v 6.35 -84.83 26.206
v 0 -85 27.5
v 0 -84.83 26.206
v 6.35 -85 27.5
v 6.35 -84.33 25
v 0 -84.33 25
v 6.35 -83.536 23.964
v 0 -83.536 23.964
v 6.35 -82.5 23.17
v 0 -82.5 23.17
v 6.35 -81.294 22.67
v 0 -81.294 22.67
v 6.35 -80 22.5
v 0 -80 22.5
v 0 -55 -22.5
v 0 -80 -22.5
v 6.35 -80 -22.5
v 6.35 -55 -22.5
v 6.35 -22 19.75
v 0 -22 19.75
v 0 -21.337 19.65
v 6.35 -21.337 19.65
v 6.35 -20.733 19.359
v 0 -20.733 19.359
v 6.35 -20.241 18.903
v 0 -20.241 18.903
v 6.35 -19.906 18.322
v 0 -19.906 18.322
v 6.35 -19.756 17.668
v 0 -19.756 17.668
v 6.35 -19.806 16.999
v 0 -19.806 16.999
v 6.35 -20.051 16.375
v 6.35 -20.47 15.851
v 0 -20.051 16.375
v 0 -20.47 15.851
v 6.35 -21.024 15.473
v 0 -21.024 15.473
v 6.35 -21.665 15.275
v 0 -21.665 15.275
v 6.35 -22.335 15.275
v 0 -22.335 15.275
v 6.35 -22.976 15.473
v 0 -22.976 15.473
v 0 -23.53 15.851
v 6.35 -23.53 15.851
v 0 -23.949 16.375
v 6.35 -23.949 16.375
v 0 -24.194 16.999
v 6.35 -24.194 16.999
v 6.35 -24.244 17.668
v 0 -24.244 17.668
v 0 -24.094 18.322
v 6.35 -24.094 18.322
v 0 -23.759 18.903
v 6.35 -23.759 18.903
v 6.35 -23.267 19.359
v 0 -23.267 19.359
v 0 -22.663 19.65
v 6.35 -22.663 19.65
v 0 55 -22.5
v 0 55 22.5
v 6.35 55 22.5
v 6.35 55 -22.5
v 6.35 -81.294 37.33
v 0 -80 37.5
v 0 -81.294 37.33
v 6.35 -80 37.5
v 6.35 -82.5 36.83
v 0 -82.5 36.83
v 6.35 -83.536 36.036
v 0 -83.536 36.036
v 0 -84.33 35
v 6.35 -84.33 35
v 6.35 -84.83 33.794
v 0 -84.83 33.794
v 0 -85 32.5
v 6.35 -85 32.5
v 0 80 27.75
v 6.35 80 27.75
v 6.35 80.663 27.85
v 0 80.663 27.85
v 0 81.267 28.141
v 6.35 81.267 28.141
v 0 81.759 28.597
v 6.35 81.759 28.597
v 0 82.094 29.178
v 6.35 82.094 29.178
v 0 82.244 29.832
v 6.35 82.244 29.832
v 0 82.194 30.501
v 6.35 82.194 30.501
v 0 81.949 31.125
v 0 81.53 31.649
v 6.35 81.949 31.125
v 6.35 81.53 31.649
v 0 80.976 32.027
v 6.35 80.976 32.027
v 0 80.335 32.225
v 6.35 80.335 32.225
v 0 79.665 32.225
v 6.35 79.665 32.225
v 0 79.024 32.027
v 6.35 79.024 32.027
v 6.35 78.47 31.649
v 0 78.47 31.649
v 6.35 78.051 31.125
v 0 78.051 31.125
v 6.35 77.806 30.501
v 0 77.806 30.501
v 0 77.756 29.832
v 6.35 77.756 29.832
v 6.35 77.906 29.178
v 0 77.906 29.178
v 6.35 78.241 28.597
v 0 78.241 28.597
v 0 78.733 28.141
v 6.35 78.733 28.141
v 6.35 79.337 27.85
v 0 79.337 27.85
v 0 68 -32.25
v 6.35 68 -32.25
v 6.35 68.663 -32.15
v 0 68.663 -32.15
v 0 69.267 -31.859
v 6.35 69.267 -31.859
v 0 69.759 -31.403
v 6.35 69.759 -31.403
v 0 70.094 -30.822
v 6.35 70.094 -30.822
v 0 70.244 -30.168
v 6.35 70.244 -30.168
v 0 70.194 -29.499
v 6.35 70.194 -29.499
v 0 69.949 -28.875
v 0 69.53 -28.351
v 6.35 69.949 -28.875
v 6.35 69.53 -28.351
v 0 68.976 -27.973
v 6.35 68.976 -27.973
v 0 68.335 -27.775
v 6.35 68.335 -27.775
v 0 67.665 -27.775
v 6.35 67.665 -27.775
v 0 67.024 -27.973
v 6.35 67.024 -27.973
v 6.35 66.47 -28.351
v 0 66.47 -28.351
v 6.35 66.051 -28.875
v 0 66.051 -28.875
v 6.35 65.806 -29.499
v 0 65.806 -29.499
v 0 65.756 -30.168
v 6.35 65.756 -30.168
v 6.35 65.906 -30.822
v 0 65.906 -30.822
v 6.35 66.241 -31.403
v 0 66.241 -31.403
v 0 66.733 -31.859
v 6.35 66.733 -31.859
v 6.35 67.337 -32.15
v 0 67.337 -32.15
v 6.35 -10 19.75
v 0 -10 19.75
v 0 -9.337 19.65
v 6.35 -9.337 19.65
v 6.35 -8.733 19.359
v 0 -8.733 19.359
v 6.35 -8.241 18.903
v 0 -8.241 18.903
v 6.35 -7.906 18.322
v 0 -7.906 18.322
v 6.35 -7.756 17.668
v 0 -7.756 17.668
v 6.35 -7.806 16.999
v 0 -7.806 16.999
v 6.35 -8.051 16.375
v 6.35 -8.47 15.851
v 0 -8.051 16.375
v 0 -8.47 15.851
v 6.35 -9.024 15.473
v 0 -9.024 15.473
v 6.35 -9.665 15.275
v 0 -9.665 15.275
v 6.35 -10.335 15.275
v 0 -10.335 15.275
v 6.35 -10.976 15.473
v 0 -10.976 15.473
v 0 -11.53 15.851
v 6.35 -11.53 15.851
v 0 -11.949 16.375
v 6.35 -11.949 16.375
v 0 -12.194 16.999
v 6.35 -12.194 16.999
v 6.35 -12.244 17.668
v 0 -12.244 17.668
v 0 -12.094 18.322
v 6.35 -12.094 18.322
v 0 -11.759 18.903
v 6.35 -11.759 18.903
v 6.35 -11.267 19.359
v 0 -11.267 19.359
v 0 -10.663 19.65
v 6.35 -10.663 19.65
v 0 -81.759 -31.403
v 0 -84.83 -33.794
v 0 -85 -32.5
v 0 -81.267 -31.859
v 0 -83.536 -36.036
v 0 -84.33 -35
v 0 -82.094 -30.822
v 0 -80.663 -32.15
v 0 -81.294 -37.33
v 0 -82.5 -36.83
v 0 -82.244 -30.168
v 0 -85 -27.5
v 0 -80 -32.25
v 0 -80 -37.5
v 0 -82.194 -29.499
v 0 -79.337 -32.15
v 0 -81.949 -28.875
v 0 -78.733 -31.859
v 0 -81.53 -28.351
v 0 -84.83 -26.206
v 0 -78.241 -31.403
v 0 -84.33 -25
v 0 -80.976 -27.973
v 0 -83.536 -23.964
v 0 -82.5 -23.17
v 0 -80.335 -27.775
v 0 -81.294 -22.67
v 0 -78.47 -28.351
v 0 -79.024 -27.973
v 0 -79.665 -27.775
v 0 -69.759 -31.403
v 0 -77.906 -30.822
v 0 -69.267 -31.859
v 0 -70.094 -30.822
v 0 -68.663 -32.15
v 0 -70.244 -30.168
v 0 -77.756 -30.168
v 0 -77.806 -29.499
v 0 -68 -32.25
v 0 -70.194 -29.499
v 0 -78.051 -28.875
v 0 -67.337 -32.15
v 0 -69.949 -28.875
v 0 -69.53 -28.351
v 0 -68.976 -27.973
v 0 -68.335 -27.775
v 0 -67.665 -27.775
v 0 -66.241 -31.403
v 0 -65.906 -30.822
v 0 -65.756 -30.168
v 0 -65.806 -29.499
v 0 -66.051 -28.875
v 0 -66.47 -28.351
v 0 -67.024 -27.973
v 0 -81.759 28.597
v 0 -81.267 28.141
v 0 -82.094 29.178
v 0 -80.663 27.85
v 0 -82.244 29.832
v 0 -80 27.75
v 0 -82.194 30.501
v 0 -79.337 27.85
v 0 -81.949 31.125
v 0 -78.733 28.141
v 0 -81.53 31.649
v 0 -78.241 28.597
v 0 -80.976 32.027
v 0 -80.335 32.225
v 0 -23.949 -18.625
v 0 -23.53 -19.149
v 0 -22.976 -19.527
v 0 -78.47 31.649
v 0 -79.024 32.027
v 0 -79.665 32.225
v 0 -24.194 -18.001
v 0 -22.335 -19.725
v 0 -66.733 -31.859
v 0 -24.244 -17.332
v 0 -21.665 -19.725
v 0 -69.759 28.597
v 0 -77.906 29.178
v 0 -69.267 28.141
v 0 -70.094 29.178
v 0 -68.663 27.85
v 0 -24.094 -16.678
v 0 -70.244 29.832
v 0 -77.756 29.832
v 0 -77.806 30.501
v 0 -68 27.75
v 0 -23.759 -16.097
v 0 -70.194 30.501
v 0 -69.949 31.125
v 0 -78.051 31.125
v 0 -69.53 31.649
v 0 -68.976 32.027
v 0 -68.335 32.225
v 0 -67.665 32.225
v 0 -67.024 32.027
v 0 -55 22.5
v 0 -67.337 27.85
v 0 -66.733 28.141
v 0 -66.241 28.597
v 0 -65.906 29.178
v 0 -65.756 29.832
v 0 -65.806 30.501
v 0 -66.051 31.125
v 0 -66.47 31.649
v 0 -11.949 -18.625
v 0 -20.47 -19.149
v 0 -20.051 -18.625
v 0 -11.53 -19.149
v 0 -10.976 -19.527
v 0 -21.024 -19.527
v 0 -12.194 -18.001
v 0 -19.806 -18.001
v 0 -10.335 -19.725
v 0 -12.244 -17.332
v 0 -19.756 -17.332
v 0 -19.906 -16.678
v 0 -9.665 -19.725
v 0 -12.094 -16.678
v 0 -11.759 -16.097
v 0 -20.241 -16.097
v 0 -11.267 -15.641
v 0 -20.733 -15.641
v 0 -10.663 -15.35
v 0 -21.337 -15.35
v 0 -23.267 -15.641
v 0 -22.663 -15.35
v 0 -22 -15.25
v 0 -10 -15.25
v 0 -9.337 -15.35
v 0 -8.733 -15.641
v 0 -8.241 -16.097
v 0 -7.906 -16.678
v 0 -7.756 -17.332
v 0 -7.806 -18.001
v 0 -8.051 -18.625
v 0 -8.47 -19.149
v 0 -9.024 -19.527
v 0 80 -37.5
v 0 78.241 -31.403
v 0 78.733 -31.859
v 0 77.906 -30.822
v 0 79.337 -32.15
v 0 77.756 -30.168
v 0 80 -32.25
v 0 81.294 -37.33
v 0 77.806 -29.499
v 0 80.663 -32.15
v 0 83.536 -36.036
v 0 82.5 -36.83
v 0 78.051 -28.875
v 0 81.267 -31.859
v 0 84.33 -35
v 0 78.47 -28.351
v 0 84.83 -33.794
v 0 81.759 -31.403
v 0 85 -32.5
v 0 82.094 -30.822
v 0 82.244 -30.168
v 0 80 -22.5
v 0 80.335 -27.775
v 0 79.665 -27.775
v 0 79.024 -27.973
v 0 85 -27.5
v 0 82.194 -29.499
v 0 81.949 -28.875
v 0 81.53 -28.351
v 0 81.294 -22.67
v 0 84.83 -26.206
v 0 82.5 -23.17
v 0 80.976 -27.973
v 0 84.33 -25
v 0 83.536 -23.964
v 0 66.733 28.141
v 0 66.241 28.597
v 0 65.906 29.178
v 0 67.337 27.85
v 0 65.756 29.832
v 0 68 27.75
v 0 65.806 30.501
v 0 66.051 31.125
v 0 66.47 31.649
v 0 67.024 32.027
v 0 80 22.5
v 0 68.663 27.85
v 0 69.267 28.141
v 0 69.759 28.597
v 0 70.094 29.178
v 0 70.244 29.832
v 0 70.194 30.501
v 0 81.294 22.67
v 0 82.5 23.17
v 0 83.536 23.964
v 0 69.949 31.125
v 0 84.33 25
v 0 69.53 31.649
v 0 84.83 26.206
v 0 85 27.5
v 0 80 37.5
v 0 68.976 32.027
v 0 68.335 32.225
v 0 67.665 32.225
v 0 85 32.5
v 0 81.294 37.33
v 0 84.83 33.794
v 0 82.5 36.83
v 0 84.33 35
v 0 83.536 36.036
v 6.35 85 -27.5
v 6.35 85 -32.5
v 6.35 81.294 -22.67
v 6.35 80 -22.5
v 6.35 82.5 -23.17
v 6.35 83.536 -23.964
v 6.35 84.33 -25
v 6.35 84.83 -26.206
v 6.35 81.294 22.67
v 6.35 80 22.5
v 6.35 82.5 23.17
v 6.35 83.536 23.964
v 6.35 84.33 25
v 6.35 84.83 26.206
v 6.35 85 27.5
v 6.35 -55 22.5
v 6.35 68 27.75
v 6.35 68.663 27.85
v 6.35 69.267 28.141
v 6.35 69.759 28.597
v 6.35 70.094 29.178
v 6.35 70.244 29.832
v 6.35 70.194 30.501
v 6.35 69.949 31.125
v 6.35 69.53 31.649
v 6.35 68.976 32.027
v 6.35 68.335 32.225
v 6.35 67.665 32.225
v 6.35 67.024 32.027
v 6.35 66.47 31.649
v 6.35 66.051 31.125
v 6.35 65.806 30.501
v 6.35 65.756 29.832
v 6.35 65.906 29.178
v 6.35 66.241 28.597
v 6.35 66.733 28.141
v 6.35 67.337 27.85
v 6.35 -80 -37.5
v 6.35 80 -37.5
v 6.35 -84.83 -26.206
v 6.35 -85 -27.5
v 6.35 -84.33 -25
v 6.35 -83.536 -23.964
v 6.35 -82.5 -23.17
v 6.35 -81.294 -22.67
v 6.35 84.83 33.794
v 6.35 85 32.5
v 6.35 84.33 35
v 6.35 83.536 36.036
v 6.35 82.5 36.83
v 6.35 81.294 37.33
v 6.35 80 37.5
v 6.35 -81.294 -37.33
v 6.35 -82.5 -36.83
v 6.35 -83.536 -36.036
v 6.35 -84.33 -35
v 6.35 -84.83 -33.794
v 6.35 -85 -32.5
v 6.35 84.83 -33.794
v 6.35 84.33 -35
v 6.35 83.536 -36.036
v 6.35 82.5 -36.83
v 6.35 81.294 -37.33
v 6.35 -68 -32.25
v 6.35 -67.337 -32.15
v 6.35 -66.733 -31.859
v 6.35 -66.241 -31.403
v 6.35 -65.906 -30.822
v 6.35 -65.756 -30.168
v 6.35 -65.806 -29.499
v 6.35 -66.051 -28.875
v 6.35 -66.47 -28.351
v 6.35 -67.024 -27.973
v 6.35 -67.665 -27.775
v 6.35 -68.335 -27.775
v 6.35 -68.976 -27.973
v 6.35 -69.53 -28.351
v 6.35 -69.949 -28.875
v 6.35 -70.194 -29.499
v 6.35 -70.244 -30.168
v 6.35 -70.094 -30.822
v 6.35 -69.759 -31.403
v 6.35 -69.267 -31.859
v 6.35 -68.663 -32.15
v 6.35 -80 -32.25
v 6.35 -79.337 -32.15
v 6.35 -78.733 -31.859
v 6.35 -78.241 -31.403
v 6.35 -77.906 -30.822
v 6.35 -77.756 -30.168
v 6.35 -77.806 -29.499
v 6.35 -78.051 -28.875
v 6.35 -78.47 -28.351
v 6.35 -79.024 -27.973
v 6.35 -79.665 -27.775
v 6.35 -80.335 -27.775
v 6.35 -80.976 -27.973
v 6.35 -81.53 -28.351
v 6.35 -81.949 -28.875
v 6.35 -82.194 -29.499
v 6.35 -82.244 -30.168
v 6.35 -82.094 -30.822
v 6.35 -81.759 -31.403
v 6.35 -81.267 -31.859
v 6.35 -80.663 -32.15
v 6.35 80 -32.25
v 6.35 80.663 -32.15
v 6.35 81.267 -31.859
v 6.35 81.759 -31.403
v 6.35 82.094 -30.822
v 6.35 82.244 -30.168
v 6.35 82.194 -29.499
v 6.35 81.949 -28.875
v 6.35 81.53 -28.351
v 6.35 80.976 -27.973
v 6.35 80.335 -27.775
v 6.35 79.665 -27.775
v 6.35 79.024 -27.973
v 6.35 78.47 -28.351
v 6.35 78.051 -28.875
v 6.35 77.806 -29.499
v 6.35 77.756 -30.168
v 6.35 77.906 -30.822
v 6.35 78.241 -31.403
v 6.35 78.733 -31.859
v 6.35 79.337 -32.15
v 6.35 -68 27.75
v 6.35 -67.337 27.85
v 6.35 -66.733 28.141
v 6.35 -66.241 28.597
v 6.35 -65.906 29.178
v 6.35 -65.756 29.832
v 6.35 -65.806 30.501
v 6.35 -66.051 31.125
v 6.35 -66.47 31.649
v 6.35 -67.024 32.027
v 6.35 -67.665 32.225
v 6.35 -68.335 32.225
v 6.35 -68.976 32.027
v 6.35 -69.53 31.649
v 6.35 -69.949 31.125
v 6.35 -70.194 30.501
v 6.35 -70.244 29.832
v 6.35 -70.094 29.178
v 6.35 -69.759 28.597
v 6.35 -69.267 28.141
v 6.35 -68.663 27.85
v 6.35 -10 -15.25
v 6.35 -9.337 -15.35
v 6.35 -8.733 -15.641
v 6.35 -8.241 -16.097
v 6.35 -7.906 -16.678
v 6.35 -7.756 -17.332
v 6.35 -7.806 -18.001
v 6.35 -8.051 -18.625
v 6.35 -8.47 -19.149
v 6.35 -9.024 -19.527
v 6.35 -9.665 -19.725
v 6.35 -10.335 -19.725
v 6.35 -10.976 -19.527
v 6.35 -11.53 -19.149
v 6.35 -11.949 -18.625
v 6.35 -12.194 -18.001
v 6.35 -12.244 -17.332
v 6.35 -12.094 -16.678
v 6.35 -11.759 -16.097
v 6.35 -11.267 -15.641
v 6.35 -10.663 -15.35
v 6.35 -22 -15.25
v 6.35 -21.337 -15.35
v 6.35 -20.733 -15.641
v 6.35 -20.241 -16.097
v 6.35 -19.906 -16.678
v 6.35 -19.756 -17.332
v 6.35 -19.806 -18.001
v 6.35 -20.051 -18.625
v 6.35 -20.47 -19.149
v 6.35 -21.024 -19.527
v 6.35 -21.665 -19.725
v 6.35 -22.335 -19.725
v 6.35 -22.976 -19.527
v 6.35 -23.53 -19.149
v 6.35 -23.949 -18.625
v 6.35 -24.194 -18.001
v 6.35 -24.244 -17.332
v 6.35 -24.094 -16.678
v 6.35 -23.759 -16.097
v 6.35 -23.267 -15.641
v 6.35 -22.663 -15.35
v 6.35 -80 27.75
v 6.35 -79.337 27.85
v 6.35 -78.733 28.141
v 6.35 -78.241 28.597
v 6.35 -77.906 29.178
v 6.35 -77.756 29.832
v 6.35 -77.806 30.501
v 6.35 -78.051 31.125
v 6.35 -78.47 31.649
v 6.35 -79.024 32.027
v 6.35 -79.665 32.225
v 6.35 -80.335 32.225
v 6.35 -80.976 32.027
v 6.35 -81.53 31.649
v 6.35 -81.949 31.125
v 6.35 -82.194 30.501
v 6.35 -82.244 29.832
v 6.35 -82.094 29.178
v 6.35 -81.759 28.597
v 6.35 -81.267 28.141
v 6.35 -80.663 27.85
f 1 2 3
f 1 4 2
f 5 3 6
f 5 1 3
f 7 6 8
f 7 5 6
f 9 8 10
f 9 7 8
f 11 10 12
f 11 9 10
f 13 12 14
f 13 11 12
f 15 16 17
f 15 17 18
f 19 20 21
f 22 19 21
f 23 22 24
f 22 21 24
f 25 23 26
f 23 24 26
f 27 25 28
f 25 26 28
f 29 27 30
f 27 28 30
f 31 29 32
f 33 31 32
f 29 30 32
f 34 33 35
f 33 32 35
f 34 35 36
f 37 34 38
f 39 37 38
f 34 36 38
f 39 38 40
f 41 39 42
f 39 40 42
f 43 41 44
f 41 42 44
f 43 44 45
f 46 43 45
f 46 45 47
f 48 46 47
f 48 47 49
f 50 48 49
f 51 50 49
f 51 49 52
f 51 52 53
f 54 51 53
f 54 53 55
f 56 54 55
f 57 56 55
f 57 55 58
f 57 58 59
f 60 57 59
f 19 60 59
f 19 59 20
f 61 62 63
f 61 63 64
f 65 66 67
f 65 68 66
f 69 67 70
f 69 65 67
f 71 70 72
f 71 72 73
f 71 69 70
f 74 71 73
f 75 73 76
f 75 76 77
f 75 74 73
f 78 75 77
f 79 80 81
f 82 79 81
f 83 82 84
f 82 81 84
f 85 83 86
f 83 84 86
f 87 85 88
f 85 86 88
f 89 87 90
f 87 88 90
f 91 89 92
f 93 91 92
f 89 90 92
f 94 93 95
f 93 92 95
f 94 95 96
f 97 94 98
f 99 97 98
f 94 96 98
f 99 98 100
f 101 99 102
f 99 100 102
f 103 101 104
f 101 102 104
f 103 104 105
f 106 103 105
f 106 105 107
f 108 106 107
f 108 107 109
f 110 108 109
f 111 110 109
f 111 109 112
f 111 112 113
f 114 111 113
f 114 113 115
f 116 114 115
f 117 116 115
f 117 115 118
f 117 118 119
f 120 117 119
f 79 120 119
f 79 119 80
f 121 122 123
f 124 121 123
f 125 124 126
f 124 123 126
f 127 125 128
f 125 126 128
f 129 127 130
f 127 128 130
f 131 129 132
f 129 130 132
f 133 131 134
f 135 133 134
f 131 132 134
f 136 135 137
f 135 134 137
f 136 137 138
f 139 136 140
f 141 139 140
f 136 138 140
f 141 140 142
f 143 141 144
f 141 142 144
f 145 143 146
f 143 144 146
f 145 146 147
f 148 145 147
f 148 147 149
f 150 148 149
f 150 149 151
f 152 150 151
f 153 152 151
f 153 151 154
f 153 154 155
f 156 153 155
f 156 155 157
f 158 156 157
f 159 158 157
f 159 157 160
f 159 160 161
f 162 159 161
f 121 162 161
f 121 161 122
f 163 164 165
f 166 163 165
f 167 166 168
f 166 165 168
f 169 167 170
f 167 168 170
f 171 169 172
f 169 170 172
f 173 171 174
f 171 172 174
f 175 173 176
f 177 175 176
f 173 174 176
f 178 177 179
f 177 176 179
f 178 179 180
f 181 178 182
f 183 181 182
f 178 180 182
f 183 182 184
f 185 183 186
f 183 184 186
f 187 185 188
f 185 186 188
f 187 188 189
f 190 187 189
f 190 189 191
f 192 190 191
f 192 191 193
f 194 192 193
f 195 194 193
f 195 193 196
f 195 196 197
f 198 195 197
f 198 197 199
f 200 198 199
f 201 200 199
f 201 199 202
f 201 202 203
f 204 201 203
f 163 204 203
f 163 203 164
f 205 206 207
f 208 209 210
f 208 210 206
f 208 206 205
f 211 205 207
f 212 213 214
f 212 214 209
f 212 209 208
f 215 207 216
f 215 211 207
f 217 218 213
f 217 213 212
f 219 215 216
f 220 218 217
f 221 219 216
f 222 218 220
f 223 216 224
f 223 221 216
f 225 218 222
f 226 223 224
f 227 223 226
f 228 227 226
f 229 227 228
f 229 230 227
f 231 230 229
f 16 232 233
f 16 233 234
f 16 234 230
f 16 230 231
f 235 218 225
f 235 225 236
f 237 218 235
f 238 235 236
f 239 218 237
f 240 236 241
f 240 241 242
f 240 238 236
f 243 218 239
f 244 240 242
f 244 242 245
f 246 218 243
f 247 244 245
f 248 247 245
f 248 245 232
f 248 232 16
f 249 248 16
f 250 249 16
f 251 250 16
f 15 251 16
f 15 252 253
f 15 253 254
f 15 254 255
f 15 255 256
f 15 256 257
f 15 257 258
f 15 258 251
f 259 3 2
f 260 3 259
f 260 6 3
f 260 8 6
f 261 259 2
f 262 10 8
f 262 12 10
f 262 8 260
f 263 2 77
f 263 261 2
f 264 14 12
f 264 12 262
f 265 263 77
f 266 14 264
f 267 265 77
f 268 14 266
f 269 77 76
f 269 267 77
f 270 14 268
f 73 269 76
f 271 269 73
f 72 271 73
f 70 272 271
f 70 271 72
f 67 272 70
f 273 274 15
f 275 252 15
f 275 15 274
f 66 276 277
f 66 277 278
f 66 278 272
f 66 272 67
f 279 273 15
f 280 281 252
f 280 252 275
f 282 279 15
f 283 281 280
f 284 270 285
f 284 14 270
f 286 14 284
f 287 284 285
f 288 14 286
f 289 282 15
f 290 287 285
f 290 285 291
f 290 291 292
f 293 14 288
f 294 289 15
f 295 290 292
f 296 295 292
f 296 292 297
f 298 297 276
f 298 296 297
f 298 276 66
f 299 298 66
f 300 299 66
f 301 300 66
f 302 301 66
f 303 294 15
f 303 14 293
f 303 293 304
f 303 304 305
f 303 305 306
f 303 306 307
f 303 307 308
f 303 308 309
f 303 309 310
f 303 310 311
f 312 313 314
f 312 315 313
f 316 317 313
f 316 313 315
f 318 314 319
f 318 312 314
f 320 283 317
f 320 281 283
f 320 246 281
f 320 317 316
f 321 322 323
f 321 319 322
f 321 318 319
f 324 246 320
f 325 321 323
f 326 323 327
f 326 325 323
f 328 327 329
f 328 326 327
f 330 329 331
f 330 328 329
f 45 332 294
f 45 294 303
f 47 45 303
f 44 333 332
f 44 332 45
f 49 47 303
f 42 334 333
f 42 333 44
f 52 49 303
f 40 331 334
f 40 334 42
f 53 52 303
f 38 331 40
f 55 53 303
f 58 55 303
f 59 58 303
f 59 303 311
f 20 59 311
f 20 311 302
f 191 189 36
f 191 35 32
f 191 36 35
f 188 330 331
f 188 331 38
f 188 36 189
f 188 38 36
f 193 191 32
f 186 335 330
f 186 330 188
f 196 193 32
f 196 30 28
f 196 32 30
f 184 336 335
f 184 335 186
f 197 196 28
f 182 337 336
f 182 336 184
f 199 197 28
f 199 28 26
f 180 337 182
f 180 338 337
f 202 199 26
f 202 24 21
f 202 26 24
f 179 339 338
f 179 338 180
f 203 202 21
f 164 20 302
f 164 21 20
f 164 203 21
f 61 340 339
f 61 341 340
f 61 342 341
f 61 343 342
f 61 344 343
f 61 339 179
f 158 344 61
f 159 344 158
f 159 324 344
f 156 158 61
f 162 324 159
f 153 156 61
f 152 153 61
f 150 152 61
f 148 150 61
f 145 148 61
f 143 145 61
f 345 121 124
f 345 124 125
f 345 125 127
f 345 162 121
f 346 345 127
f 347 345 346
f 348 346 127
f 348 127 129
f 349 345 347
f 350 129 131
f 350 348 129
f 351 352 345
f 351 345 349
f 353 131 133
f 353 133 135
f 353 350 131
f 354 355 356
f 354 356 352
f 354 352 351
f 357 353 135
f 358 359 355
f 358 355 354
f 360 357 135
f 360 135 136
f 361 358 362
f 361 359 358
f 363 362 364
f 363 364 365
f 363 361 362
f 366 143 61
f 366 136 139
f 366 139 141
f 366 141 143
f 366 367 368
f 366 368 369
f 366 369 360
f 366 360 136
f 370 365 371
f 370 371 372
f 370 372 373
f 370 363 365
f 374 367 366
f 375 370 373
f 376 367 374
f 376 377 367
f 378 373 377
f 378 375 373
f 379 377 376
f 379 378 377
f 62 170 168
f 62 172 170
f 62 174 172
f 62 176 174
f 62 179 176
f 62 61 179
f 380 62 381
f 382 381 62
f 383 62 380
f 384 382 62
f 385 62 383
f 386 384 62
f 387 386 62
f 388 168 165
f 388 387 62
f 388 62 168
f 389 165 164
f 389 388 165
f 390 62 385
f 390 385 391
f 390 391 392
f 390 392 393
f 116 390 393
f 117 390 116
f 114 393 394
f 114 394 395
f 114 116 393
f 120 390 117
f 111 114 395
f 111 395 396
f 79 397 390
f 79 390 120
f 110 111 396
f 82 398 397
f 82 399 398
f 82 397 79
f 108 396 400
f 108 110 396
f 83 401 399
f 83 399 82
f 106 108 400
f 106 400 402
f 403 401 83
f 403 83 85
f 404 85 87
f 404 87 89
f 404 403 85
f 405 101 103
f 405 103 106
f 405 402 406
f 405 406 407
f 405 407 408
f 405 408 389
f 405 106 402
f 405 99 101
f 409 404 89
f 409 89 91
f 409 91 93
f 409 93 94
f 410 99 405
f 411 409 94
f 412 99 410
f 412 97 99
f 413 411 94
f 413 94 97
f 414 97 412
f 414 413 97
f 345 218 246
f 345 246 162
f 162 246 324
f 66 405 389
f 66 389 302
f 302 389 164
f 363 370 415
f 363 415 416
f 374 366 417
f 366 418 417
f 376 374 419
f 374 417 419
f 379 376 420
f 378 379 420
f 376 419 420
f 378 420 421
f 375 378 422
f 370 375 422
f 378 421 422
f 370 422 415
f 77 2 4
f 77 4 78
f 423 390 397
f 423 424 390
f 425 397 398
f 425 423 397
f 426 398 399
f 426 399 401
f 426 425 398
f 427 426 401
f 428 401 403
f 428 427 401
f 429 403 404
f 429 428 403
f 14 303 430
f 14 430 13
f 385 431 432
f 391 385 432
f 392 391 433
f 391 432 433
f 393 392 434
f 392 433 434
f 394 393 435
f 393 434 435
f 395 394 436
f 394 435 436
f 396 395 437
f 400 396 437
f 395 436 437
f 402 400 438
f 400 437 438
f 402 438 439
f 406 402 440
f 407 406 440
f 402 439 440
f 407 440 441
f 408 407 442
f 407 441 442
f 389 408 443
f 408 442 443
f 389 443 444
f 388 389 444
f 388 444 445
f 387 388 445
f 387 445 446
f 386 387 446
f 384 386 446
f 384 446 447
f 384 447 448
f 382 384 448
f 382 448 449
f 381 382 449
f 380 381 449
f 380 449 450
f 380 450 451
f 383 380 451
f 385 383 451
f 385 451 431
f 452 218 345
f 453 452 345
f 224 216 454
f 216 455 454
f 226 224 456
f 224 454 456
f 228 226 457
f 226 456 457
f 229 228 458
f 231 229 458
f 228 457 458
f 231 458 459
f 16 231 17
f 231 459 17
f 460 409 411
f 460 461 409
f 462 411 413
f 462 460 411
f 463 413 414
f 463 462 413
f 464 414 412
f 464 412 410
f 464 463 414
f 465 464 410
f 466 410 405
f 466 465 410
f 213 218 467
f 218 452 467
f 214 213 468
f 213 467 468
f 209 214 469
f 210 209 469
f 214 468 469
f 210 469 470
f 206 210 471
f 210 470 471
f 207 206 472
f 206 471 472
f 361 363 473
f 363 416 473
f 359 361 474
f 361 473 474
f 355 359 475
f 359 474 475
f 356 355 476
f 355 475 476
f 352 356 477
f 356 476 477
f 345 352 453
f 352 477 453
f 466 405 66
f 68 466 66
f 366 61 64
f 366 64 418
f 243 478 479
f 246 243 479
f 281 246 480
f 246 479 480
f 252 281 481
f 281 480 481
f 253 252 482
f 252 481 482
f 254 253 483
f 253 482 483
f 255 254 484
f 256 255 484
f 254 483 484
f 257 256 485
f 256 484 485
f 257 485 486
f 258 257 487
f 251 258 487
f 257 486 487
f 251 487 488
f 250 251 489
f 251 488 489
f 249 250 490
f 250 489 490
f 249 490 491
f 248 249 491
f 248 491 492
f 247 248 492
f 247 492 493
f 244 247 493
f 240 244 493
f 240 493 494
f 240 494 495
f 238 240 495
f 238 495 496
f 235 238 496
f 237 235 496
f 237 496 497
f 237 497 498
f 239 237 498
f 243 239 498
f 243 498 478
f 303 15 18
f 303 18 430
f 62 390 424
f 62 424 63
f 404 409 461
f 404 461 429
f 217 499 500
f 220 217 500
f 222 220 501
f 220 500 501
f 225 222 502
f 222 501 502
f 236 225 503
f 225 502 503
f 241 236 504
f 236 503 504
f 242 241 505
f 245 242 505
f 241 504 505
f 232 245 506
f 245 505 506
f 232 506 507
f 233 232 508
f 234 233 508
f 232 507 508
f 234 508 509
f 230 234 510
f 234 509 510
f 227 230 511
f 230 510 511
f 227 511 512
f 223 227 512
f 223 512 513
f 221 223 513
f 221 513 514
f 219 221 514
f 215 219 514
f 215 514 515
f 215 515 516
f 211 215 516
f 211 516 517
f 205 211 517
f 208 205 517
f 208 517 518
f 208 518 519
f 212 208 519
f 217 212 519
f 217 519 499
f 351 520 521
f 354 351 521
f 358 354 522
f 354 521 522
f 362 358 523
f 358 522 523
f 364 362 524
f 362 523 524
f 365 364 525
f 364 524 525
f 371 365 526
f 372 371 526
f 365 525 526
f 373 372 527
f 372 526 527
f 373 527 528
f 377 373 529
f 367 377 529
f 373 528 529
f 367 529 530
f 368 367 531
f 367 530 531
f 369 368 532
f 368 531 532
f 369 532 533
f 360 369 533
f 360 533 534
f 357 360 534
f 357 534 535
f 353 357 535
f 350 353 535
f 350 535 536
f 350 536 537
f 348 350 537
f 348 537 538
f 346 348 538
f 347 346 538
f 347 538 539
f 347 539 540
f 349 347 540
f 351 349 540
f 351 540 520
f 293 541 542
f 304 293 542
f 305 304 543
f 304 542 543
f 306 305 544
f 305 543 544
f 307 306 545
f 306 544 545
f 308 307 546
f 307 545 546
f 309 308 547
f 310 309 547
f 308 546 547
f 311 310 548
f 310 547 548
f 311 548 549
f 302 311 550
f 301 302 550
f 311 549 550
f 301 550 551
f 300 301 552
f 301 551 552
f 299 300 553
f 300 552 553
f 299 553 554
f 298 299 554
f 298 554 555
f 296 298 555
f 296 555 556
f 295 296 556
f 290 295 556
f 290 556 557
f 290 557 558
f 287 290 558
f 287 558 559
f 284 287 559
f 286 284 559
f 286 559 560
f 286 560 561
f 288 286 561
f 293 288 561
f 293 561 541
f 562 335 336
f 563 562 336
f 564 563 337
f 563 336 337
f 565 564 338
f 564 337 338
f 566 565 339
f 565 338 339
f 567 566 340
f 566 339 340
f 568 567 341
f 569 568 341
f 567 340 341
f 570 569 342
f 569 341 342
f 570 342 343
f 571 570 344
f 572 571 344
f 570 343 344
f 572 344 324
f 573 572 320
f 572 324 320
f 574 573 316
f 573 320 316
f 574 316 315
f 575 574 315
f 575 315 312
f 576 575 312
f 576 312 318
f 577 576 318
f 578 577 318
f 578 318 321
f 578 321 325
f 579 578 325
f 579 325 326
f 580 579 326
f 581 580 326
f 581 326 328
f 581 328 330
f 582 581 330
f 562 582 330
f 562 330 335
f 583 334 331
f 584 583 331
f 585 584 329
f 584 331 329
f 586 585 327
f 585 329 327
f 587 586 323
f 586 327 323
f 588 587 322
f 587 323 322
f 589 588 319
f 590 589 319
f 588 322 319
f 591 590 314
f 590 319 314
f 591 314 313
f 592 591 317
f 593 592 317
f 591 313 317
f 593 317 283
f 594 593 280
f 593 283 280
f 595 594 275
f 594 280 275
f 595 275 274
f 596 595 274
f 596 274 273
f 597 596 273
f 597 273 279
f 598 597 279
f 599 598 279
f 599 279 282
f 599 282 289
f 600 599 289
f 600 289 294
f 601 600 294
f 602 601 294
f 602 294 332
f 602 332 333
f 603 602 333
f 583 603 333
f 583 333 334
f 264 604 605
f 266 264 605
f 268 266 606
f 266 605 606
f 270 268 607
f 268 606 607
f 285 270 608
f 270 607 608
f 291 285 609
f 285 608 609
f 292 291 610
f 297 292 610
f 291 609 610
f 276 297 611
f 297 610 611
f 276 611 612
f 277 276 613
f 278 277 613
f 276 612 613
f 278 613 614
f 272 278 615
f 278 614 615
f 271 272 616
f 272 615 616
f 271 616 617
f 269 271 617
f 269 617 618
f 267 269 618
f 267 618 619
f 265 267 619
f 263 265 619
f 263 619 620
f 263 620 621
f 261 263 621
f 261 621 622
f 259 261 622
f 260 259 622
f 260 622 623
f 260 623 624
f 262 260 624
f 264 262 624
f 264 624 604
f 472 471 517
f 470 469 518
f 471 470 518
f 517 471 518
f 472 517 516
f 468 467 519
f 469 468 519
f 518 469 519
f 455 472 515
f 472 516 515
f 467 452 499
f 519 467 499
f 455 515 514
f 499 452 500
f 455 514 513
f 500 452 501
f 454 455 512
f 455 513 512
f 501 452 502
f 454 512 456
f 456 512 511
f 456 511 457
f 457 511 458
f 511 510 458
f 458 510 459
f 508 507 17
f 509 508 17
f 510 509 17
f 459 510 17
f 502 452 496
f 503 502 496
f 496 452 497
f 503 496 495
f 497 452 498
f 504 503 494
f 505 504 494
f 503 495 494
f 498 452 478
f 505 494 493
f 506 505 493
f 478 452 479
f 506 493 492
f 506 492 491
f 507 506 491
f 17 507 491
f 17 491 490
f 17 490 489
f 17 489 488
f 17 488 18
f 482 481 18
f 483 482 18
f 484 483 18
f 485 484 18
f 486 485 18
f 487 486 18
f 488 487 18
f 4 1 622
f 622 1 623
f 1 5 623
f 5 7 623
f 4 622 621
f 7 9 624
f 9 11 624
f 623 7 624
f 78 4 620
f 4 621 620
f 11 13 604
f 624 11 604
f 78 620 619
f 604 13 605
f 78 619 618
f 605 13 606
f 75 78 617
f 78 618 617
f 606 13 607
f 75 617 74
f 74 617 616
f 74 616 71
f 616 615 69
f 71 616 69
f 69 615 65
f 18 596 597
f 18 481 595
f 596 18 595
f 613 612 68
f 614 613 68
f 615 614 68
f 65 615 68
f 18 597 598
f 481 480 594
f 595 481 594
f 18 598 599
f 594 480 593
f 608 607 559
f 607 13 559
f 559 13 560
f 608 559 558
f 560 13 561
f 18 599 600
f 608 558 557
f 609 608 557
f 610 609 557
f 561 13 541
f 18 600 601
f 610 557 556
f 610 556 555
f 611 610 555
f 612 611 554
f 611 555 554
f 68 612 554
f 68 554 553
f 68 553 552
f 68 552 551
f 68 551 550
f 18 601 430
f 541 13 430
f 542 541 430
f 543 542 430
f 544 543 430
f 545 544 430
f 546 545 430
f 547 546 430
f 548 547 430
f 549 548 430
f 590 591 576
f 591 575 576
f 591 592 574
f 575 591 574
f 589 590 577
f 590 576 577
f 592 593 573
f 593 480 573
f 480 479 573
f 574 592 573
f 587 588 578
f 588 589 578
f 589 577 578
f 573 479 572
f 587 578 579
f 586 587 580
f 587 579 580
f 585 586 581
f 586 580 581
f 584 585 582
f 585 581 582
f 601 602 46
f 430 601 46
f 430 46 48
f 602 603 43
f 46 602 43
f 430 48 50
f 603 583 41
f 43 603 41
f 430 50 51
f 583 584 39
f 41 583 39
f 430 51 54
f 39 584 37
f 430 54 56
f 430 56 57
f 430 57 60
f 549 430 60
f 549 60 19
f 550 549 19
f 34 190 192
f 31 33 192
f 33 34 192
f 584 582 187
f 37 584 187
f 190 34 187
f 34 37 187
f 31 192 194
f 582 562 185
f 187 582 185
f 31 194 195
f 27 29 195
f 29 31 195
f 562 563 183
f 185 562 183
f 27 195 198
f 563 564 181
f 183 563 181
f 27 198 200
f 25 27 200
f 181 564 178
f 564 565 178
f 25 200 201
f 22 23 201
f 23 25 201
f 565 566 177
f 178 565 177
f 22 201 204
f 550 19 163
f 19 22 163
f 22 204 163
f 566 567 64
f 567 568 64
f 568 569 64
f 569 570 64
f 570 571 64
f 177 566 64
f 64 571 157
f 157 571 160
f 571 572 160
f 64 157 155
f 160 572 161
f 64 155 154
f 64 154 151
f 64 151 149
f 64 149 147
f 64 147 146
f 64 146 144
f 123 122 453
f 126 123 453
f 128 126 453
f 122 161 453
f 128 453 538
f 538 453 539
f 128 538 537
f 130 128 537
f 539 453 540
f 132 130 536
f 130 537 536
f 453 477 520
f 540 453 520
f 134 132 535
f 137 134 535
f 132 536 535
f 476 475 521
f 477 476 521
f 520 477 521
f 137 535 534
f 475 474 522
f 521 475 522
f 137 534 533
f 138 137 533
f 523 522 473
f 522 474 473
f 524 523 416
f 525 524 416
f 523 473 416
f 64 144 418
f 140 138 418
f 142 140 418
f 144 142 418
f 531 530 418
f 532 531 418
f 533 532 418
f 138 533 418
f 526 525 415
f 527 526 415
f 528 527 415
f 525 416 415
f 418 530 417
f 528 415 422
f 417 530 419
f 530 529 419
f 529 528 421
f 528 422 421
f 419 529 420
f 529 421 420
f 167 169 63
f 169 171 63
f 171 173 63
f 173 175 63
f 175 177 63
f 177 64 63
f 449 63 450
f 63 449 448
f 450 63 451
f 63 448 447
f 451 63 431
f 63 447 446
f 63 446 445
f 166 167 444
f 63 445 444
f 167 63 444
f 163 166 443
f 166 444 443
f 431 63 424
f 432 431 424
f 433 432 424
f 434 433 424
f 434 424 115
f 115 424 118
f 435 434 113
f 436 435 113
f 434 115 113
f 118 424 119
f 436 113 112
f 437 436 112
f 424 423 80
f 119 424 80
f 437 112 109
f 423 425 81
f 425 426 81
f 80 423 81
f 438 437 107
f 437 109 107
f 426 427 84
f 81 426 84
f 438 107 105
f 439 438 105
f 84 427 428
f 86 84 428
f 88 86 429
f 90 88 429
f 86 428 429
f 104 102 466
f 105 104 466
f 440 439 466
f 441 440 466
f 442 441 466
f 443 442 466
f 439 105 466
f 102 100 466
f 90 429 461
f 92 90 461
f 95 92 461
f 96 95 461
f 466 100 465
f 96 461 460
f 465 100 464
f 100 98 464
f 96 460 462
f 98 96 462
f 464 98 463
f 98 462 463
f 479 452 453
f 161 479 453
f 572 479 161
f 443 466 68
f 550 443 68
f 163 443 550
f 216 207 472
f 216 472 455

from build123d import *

# Parameters (mm, degrees)
SALIENTE_EXTRUIR1_DEPTH      = 6.35
TALADRO_DE_MARGEN_PARA_M41_D = 4.5
REDONDEO1_R                  = 5
TALADRO_DE_MARGEN_PARA_M42_D = 4.5


with BuildPart() as part:
    # Croquis1 → Saliente-Extruir1 (new body)
    with BuildSketch(Plane(origin=(0, 0, 0), x_dir=(0, 0, -1), z_dir=(1, 0, 0))):
        Polygon((-22.5, 85), (-22.5, 55), (22.5, 55), (22.5, 85), (37.5, 85), (37.5, 35), (37.5, -35), (37.5, -85), (22.5, -85), (22.5, -55), (-22.5, -55), (-22.5, -85), (-37.5, -85), (-37.5, -35), (-37.5, 35), (-37.5, 85), align=None)
    extrude(amount=SALIENTE_EXTRUIR1_DEPTH)

    # Taladro de margen para M41 (through all)
    with Locations(Plane.ZY):
        with Locations((30, 68), (30, 80), (-30, 68), (-30, 80), (30, -80), (30, -68), (-30, -80), (-30, -68)):
            Hole(TALADRO_DE_MARGEN_PARA_M41_D / 2)

    # Redondeo1
    redondeo1_edges = [part.edges().sort_by_distance(p)[0] for p in [
        (3.175, 85, 22.5),
        (3.175, 85, -22.5),
        (3.175, 85, -37.5),
        (3.175, -85, -37.5),
        (3.175, -85, -22.5),
        (3.175, -85, 22.5),
        (3.175, -85, 37.5),
        (3.175, 85, 37.5),
    ]]
    fillet(redondeo1_edges, radius=REDONDEO1_R)

    # Taladro de margen para M42 (through all)
    with Locations(Plane(origin=(6.35, 0, 0), x_dir=(0, 0, -1), z_dir=(1, 0, 0))):
        with Locations((-17.5, -10), (17.5, -10), (17.5, -22), (-17.5, -22)):
            Hole(TALADRO_DE_MARGEN_PARA_M42_D / 2)


solid = part.part
